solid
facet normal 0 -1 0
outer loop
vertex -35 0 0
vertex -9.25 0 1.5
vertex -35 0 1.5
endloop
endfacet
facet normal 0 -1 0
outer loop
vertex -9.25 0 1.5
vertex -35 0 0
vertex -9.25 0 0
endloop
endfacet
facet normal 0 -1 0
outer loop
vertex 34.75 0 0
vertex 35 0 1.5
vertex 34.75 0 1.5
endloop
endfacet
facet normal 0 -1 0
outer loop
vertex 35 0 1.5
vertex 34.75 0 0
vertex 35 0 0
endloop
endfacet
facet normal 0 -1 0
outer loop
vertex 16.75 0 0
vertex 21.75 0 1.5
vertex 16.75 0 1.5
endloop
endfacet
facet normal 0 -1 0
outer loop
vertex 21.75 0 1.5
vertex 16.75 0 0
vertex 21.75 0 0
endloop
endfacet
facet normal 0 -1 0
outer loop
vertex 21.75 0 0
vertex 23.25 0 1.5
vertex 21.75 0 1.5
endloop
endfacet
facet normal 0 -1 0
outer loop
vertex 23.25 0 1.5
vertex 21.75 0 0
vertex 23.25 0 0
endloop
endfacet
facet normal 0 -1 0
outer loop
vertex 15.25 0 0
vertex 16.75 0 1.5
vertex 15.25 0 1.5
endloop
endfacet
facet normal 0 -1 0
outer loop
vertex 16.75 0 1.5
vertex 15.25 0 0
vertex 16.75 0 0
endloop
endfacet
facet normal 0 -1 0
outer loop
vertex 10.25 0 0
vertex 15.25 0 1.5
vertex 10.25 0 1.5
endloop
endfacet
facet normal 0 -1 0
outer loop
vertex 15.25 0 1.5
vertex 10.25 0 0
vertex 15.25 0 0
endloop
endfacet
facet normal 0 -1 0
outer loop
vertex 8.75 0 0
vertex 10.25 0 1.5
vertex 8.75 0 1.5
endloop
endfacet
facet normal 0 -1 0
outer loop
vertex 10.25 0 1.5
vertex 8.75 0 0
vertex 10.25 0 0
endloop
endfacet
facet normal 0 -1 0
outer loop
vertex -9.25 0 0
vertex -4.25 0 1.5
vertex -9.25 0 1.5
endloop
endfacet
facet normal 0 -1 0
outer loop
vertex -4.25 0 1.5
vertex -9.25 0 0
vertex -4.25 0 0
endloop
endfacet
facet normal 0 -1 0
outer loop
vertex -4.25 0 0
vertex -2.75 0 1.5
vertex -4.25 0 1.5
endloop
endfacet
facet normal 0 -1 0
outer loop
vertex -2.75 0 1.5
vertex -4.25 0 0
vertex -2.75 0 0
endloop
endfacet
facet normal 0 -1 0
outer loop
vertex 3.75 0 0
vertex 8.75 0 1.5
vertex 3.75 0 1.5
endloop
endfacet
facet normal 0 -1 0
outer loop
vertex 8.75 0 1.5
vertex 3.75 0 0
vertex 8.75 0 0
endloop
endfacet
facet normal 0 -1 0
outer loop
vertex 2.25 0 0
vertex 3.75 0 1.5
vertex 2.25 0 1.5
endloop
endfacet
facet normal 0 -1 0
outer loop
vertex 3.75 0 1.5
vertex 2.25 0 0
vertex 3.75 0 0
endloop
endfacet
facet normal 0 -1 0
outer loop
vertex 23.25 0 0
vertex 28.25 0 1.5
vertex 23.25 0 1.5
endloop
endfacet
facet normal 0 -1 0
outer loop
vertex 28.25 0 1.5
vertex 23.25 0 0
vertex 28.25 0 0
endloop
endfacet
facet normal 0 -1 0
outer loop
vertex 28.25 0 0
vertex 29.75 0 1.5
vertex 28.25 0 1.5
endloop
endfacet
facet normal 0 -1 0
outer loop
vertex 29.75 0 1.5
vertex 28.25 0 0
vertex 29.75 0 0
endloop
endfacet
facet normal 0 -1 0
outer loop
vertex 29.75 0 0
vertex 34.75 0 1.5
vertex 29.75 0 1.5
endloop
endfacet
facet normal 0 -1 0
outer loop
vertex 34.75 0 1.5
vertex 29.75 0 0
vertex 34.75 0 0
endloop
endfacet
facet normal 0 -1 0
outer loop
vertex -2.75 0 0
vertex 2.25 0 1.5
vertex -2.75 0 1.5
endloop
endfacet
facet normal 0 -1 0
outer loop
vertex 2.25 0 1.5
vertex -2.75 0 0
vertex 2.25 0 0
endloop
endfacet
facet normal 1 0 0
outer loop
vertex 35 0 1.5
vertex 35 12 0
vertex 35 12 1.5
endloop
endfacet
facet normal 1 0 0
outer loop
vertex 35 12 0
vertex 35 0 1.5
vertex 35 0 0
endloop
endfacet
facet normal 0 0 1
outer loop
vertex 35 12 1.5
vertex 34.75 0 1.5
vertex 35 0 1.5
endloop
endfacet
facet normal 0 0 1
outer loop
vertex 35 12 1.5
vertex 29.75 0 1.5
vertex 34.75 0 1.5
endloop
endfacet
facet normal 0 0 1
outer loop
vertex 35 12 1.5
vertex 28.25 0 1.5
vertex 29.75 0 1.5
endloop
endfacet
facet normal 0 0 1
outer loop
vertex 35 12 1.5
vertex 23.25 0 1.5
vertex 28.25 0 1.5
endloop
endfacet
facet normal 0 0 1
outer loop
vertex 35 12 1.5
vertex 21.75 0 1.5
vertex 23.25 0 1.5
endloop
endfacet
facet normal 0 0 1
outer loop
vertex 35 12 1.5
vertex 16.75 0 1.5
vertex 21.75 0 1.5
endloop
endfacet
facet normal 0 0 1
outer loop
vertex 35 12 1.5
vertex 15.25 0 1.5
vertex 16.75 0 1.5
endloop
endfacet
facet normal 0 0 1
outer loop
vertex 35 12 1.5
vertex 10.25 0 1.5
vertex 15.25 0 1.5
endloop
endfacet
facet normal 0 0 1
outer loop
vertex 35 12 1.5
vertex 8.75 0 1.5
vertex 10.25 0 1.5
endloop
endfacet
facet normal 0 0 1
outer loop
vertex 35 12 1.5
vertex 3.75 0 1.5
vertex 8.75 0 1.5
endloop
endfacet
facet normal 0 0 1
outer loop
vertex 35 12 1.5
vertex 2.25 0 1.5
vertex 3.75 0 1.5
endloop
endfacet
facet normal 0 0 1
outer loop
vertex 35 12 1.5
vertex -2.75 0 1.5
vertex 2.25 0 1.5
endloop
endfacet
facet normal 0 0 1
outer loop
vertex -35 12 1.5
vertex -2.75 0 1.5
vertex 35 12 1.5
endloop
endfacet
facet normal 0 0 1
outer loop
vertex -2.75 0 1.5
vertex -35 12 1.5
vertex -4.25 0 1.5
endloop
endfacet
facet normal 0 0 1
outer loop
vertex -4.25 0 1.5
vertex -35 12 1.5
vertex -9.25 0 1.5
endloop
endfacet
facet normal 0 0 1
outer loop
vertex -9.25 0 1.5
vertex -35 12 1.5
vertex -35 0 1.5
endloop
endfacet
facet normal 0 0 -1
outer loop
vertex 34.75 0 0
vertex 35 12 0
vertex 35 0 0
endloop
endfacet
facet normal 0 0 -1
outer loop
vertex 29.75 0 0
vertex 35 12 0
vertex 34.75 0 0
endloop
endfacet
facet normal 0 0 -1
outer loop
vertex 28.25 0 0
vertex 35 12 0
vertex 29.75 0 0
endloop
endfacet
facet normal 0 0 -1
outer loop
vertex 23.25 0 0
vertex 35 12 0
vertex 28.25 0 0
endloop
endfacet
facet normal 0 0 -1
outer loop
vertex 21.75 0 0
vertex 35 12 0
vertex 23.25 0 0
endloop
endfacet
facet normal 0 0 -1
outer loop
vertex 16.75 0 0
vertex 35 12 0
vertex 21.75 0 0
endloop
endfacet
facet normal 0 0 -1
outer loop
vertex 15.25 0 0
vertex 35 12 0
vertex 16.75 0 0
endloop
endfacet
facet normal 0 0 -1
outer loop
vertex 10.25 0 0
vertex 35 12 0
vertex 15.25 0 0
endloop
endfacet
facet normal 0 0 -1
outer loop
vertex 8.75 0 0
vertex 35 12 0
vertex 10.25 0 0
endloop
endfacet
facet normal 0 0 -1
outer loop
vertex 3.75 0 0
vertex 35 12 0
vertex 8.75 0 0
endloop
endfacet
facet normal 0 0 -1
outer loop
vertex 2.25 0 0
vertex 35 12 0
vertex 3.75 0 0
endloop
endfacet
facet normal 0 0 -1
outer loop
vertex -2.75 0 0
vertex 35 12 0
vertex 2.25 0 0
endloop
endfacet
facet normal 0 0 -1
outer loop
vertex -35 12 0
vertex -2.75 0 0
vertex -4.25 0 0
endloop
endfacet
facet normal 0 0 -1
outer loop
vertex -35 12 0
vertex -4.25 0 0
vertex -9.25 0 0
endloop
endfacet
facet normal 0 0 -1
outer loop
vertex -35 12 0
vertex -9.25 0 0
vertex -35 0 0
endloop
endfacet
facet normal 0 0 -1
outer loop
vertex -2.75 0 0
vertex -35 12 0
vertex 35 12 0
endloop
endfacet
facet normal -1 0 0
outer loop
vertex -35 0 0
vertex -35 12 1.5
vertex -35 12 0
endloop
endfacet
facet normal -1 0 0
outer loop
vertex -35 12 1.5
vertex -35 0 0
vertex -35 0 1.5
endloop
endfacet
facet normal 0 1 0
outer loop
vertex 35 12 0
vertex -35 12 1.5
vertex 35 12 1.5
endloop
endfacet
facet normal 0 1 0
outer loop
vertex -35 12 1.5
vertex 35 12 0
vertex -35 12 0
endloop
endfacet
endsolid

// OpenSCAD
// 10-well agarose gel comb - printed lying flat
// Units: mm

plate_t      = 1.5;   // plate thickness (Z)
spine_len    = 70;    // spine length (X)
spine_w      = 12;    // spine width (Y)
tooth_count  = 10;    // number of teeth
tooth_w      = 5.0;   // tooth width (X)
tooth_len    = 12;    // tooth length (Y)
gap          = 1.5;   // gap between teeth (X)
eps          = 0.5;   // cutter overshoot

$fn = 64;

pitch = tooth_w + gap;  // 6.5 mm
x0    = -(tooth_count - 1) * gap / 2;  // first tooth left edge

difference() {
    // Spine
    translate([-spine_len / 2, 0, 0])
        cube([spine_len, spine_w, plate_t]);

    // Teeth
    for (i = [0 : tooth_count - 1])
        translate([x0 + i * pitch - tooth_w / 2, -tooth_len, 0])
            cube([tooth_w, tooth_len, plate_t + eps]);
}
